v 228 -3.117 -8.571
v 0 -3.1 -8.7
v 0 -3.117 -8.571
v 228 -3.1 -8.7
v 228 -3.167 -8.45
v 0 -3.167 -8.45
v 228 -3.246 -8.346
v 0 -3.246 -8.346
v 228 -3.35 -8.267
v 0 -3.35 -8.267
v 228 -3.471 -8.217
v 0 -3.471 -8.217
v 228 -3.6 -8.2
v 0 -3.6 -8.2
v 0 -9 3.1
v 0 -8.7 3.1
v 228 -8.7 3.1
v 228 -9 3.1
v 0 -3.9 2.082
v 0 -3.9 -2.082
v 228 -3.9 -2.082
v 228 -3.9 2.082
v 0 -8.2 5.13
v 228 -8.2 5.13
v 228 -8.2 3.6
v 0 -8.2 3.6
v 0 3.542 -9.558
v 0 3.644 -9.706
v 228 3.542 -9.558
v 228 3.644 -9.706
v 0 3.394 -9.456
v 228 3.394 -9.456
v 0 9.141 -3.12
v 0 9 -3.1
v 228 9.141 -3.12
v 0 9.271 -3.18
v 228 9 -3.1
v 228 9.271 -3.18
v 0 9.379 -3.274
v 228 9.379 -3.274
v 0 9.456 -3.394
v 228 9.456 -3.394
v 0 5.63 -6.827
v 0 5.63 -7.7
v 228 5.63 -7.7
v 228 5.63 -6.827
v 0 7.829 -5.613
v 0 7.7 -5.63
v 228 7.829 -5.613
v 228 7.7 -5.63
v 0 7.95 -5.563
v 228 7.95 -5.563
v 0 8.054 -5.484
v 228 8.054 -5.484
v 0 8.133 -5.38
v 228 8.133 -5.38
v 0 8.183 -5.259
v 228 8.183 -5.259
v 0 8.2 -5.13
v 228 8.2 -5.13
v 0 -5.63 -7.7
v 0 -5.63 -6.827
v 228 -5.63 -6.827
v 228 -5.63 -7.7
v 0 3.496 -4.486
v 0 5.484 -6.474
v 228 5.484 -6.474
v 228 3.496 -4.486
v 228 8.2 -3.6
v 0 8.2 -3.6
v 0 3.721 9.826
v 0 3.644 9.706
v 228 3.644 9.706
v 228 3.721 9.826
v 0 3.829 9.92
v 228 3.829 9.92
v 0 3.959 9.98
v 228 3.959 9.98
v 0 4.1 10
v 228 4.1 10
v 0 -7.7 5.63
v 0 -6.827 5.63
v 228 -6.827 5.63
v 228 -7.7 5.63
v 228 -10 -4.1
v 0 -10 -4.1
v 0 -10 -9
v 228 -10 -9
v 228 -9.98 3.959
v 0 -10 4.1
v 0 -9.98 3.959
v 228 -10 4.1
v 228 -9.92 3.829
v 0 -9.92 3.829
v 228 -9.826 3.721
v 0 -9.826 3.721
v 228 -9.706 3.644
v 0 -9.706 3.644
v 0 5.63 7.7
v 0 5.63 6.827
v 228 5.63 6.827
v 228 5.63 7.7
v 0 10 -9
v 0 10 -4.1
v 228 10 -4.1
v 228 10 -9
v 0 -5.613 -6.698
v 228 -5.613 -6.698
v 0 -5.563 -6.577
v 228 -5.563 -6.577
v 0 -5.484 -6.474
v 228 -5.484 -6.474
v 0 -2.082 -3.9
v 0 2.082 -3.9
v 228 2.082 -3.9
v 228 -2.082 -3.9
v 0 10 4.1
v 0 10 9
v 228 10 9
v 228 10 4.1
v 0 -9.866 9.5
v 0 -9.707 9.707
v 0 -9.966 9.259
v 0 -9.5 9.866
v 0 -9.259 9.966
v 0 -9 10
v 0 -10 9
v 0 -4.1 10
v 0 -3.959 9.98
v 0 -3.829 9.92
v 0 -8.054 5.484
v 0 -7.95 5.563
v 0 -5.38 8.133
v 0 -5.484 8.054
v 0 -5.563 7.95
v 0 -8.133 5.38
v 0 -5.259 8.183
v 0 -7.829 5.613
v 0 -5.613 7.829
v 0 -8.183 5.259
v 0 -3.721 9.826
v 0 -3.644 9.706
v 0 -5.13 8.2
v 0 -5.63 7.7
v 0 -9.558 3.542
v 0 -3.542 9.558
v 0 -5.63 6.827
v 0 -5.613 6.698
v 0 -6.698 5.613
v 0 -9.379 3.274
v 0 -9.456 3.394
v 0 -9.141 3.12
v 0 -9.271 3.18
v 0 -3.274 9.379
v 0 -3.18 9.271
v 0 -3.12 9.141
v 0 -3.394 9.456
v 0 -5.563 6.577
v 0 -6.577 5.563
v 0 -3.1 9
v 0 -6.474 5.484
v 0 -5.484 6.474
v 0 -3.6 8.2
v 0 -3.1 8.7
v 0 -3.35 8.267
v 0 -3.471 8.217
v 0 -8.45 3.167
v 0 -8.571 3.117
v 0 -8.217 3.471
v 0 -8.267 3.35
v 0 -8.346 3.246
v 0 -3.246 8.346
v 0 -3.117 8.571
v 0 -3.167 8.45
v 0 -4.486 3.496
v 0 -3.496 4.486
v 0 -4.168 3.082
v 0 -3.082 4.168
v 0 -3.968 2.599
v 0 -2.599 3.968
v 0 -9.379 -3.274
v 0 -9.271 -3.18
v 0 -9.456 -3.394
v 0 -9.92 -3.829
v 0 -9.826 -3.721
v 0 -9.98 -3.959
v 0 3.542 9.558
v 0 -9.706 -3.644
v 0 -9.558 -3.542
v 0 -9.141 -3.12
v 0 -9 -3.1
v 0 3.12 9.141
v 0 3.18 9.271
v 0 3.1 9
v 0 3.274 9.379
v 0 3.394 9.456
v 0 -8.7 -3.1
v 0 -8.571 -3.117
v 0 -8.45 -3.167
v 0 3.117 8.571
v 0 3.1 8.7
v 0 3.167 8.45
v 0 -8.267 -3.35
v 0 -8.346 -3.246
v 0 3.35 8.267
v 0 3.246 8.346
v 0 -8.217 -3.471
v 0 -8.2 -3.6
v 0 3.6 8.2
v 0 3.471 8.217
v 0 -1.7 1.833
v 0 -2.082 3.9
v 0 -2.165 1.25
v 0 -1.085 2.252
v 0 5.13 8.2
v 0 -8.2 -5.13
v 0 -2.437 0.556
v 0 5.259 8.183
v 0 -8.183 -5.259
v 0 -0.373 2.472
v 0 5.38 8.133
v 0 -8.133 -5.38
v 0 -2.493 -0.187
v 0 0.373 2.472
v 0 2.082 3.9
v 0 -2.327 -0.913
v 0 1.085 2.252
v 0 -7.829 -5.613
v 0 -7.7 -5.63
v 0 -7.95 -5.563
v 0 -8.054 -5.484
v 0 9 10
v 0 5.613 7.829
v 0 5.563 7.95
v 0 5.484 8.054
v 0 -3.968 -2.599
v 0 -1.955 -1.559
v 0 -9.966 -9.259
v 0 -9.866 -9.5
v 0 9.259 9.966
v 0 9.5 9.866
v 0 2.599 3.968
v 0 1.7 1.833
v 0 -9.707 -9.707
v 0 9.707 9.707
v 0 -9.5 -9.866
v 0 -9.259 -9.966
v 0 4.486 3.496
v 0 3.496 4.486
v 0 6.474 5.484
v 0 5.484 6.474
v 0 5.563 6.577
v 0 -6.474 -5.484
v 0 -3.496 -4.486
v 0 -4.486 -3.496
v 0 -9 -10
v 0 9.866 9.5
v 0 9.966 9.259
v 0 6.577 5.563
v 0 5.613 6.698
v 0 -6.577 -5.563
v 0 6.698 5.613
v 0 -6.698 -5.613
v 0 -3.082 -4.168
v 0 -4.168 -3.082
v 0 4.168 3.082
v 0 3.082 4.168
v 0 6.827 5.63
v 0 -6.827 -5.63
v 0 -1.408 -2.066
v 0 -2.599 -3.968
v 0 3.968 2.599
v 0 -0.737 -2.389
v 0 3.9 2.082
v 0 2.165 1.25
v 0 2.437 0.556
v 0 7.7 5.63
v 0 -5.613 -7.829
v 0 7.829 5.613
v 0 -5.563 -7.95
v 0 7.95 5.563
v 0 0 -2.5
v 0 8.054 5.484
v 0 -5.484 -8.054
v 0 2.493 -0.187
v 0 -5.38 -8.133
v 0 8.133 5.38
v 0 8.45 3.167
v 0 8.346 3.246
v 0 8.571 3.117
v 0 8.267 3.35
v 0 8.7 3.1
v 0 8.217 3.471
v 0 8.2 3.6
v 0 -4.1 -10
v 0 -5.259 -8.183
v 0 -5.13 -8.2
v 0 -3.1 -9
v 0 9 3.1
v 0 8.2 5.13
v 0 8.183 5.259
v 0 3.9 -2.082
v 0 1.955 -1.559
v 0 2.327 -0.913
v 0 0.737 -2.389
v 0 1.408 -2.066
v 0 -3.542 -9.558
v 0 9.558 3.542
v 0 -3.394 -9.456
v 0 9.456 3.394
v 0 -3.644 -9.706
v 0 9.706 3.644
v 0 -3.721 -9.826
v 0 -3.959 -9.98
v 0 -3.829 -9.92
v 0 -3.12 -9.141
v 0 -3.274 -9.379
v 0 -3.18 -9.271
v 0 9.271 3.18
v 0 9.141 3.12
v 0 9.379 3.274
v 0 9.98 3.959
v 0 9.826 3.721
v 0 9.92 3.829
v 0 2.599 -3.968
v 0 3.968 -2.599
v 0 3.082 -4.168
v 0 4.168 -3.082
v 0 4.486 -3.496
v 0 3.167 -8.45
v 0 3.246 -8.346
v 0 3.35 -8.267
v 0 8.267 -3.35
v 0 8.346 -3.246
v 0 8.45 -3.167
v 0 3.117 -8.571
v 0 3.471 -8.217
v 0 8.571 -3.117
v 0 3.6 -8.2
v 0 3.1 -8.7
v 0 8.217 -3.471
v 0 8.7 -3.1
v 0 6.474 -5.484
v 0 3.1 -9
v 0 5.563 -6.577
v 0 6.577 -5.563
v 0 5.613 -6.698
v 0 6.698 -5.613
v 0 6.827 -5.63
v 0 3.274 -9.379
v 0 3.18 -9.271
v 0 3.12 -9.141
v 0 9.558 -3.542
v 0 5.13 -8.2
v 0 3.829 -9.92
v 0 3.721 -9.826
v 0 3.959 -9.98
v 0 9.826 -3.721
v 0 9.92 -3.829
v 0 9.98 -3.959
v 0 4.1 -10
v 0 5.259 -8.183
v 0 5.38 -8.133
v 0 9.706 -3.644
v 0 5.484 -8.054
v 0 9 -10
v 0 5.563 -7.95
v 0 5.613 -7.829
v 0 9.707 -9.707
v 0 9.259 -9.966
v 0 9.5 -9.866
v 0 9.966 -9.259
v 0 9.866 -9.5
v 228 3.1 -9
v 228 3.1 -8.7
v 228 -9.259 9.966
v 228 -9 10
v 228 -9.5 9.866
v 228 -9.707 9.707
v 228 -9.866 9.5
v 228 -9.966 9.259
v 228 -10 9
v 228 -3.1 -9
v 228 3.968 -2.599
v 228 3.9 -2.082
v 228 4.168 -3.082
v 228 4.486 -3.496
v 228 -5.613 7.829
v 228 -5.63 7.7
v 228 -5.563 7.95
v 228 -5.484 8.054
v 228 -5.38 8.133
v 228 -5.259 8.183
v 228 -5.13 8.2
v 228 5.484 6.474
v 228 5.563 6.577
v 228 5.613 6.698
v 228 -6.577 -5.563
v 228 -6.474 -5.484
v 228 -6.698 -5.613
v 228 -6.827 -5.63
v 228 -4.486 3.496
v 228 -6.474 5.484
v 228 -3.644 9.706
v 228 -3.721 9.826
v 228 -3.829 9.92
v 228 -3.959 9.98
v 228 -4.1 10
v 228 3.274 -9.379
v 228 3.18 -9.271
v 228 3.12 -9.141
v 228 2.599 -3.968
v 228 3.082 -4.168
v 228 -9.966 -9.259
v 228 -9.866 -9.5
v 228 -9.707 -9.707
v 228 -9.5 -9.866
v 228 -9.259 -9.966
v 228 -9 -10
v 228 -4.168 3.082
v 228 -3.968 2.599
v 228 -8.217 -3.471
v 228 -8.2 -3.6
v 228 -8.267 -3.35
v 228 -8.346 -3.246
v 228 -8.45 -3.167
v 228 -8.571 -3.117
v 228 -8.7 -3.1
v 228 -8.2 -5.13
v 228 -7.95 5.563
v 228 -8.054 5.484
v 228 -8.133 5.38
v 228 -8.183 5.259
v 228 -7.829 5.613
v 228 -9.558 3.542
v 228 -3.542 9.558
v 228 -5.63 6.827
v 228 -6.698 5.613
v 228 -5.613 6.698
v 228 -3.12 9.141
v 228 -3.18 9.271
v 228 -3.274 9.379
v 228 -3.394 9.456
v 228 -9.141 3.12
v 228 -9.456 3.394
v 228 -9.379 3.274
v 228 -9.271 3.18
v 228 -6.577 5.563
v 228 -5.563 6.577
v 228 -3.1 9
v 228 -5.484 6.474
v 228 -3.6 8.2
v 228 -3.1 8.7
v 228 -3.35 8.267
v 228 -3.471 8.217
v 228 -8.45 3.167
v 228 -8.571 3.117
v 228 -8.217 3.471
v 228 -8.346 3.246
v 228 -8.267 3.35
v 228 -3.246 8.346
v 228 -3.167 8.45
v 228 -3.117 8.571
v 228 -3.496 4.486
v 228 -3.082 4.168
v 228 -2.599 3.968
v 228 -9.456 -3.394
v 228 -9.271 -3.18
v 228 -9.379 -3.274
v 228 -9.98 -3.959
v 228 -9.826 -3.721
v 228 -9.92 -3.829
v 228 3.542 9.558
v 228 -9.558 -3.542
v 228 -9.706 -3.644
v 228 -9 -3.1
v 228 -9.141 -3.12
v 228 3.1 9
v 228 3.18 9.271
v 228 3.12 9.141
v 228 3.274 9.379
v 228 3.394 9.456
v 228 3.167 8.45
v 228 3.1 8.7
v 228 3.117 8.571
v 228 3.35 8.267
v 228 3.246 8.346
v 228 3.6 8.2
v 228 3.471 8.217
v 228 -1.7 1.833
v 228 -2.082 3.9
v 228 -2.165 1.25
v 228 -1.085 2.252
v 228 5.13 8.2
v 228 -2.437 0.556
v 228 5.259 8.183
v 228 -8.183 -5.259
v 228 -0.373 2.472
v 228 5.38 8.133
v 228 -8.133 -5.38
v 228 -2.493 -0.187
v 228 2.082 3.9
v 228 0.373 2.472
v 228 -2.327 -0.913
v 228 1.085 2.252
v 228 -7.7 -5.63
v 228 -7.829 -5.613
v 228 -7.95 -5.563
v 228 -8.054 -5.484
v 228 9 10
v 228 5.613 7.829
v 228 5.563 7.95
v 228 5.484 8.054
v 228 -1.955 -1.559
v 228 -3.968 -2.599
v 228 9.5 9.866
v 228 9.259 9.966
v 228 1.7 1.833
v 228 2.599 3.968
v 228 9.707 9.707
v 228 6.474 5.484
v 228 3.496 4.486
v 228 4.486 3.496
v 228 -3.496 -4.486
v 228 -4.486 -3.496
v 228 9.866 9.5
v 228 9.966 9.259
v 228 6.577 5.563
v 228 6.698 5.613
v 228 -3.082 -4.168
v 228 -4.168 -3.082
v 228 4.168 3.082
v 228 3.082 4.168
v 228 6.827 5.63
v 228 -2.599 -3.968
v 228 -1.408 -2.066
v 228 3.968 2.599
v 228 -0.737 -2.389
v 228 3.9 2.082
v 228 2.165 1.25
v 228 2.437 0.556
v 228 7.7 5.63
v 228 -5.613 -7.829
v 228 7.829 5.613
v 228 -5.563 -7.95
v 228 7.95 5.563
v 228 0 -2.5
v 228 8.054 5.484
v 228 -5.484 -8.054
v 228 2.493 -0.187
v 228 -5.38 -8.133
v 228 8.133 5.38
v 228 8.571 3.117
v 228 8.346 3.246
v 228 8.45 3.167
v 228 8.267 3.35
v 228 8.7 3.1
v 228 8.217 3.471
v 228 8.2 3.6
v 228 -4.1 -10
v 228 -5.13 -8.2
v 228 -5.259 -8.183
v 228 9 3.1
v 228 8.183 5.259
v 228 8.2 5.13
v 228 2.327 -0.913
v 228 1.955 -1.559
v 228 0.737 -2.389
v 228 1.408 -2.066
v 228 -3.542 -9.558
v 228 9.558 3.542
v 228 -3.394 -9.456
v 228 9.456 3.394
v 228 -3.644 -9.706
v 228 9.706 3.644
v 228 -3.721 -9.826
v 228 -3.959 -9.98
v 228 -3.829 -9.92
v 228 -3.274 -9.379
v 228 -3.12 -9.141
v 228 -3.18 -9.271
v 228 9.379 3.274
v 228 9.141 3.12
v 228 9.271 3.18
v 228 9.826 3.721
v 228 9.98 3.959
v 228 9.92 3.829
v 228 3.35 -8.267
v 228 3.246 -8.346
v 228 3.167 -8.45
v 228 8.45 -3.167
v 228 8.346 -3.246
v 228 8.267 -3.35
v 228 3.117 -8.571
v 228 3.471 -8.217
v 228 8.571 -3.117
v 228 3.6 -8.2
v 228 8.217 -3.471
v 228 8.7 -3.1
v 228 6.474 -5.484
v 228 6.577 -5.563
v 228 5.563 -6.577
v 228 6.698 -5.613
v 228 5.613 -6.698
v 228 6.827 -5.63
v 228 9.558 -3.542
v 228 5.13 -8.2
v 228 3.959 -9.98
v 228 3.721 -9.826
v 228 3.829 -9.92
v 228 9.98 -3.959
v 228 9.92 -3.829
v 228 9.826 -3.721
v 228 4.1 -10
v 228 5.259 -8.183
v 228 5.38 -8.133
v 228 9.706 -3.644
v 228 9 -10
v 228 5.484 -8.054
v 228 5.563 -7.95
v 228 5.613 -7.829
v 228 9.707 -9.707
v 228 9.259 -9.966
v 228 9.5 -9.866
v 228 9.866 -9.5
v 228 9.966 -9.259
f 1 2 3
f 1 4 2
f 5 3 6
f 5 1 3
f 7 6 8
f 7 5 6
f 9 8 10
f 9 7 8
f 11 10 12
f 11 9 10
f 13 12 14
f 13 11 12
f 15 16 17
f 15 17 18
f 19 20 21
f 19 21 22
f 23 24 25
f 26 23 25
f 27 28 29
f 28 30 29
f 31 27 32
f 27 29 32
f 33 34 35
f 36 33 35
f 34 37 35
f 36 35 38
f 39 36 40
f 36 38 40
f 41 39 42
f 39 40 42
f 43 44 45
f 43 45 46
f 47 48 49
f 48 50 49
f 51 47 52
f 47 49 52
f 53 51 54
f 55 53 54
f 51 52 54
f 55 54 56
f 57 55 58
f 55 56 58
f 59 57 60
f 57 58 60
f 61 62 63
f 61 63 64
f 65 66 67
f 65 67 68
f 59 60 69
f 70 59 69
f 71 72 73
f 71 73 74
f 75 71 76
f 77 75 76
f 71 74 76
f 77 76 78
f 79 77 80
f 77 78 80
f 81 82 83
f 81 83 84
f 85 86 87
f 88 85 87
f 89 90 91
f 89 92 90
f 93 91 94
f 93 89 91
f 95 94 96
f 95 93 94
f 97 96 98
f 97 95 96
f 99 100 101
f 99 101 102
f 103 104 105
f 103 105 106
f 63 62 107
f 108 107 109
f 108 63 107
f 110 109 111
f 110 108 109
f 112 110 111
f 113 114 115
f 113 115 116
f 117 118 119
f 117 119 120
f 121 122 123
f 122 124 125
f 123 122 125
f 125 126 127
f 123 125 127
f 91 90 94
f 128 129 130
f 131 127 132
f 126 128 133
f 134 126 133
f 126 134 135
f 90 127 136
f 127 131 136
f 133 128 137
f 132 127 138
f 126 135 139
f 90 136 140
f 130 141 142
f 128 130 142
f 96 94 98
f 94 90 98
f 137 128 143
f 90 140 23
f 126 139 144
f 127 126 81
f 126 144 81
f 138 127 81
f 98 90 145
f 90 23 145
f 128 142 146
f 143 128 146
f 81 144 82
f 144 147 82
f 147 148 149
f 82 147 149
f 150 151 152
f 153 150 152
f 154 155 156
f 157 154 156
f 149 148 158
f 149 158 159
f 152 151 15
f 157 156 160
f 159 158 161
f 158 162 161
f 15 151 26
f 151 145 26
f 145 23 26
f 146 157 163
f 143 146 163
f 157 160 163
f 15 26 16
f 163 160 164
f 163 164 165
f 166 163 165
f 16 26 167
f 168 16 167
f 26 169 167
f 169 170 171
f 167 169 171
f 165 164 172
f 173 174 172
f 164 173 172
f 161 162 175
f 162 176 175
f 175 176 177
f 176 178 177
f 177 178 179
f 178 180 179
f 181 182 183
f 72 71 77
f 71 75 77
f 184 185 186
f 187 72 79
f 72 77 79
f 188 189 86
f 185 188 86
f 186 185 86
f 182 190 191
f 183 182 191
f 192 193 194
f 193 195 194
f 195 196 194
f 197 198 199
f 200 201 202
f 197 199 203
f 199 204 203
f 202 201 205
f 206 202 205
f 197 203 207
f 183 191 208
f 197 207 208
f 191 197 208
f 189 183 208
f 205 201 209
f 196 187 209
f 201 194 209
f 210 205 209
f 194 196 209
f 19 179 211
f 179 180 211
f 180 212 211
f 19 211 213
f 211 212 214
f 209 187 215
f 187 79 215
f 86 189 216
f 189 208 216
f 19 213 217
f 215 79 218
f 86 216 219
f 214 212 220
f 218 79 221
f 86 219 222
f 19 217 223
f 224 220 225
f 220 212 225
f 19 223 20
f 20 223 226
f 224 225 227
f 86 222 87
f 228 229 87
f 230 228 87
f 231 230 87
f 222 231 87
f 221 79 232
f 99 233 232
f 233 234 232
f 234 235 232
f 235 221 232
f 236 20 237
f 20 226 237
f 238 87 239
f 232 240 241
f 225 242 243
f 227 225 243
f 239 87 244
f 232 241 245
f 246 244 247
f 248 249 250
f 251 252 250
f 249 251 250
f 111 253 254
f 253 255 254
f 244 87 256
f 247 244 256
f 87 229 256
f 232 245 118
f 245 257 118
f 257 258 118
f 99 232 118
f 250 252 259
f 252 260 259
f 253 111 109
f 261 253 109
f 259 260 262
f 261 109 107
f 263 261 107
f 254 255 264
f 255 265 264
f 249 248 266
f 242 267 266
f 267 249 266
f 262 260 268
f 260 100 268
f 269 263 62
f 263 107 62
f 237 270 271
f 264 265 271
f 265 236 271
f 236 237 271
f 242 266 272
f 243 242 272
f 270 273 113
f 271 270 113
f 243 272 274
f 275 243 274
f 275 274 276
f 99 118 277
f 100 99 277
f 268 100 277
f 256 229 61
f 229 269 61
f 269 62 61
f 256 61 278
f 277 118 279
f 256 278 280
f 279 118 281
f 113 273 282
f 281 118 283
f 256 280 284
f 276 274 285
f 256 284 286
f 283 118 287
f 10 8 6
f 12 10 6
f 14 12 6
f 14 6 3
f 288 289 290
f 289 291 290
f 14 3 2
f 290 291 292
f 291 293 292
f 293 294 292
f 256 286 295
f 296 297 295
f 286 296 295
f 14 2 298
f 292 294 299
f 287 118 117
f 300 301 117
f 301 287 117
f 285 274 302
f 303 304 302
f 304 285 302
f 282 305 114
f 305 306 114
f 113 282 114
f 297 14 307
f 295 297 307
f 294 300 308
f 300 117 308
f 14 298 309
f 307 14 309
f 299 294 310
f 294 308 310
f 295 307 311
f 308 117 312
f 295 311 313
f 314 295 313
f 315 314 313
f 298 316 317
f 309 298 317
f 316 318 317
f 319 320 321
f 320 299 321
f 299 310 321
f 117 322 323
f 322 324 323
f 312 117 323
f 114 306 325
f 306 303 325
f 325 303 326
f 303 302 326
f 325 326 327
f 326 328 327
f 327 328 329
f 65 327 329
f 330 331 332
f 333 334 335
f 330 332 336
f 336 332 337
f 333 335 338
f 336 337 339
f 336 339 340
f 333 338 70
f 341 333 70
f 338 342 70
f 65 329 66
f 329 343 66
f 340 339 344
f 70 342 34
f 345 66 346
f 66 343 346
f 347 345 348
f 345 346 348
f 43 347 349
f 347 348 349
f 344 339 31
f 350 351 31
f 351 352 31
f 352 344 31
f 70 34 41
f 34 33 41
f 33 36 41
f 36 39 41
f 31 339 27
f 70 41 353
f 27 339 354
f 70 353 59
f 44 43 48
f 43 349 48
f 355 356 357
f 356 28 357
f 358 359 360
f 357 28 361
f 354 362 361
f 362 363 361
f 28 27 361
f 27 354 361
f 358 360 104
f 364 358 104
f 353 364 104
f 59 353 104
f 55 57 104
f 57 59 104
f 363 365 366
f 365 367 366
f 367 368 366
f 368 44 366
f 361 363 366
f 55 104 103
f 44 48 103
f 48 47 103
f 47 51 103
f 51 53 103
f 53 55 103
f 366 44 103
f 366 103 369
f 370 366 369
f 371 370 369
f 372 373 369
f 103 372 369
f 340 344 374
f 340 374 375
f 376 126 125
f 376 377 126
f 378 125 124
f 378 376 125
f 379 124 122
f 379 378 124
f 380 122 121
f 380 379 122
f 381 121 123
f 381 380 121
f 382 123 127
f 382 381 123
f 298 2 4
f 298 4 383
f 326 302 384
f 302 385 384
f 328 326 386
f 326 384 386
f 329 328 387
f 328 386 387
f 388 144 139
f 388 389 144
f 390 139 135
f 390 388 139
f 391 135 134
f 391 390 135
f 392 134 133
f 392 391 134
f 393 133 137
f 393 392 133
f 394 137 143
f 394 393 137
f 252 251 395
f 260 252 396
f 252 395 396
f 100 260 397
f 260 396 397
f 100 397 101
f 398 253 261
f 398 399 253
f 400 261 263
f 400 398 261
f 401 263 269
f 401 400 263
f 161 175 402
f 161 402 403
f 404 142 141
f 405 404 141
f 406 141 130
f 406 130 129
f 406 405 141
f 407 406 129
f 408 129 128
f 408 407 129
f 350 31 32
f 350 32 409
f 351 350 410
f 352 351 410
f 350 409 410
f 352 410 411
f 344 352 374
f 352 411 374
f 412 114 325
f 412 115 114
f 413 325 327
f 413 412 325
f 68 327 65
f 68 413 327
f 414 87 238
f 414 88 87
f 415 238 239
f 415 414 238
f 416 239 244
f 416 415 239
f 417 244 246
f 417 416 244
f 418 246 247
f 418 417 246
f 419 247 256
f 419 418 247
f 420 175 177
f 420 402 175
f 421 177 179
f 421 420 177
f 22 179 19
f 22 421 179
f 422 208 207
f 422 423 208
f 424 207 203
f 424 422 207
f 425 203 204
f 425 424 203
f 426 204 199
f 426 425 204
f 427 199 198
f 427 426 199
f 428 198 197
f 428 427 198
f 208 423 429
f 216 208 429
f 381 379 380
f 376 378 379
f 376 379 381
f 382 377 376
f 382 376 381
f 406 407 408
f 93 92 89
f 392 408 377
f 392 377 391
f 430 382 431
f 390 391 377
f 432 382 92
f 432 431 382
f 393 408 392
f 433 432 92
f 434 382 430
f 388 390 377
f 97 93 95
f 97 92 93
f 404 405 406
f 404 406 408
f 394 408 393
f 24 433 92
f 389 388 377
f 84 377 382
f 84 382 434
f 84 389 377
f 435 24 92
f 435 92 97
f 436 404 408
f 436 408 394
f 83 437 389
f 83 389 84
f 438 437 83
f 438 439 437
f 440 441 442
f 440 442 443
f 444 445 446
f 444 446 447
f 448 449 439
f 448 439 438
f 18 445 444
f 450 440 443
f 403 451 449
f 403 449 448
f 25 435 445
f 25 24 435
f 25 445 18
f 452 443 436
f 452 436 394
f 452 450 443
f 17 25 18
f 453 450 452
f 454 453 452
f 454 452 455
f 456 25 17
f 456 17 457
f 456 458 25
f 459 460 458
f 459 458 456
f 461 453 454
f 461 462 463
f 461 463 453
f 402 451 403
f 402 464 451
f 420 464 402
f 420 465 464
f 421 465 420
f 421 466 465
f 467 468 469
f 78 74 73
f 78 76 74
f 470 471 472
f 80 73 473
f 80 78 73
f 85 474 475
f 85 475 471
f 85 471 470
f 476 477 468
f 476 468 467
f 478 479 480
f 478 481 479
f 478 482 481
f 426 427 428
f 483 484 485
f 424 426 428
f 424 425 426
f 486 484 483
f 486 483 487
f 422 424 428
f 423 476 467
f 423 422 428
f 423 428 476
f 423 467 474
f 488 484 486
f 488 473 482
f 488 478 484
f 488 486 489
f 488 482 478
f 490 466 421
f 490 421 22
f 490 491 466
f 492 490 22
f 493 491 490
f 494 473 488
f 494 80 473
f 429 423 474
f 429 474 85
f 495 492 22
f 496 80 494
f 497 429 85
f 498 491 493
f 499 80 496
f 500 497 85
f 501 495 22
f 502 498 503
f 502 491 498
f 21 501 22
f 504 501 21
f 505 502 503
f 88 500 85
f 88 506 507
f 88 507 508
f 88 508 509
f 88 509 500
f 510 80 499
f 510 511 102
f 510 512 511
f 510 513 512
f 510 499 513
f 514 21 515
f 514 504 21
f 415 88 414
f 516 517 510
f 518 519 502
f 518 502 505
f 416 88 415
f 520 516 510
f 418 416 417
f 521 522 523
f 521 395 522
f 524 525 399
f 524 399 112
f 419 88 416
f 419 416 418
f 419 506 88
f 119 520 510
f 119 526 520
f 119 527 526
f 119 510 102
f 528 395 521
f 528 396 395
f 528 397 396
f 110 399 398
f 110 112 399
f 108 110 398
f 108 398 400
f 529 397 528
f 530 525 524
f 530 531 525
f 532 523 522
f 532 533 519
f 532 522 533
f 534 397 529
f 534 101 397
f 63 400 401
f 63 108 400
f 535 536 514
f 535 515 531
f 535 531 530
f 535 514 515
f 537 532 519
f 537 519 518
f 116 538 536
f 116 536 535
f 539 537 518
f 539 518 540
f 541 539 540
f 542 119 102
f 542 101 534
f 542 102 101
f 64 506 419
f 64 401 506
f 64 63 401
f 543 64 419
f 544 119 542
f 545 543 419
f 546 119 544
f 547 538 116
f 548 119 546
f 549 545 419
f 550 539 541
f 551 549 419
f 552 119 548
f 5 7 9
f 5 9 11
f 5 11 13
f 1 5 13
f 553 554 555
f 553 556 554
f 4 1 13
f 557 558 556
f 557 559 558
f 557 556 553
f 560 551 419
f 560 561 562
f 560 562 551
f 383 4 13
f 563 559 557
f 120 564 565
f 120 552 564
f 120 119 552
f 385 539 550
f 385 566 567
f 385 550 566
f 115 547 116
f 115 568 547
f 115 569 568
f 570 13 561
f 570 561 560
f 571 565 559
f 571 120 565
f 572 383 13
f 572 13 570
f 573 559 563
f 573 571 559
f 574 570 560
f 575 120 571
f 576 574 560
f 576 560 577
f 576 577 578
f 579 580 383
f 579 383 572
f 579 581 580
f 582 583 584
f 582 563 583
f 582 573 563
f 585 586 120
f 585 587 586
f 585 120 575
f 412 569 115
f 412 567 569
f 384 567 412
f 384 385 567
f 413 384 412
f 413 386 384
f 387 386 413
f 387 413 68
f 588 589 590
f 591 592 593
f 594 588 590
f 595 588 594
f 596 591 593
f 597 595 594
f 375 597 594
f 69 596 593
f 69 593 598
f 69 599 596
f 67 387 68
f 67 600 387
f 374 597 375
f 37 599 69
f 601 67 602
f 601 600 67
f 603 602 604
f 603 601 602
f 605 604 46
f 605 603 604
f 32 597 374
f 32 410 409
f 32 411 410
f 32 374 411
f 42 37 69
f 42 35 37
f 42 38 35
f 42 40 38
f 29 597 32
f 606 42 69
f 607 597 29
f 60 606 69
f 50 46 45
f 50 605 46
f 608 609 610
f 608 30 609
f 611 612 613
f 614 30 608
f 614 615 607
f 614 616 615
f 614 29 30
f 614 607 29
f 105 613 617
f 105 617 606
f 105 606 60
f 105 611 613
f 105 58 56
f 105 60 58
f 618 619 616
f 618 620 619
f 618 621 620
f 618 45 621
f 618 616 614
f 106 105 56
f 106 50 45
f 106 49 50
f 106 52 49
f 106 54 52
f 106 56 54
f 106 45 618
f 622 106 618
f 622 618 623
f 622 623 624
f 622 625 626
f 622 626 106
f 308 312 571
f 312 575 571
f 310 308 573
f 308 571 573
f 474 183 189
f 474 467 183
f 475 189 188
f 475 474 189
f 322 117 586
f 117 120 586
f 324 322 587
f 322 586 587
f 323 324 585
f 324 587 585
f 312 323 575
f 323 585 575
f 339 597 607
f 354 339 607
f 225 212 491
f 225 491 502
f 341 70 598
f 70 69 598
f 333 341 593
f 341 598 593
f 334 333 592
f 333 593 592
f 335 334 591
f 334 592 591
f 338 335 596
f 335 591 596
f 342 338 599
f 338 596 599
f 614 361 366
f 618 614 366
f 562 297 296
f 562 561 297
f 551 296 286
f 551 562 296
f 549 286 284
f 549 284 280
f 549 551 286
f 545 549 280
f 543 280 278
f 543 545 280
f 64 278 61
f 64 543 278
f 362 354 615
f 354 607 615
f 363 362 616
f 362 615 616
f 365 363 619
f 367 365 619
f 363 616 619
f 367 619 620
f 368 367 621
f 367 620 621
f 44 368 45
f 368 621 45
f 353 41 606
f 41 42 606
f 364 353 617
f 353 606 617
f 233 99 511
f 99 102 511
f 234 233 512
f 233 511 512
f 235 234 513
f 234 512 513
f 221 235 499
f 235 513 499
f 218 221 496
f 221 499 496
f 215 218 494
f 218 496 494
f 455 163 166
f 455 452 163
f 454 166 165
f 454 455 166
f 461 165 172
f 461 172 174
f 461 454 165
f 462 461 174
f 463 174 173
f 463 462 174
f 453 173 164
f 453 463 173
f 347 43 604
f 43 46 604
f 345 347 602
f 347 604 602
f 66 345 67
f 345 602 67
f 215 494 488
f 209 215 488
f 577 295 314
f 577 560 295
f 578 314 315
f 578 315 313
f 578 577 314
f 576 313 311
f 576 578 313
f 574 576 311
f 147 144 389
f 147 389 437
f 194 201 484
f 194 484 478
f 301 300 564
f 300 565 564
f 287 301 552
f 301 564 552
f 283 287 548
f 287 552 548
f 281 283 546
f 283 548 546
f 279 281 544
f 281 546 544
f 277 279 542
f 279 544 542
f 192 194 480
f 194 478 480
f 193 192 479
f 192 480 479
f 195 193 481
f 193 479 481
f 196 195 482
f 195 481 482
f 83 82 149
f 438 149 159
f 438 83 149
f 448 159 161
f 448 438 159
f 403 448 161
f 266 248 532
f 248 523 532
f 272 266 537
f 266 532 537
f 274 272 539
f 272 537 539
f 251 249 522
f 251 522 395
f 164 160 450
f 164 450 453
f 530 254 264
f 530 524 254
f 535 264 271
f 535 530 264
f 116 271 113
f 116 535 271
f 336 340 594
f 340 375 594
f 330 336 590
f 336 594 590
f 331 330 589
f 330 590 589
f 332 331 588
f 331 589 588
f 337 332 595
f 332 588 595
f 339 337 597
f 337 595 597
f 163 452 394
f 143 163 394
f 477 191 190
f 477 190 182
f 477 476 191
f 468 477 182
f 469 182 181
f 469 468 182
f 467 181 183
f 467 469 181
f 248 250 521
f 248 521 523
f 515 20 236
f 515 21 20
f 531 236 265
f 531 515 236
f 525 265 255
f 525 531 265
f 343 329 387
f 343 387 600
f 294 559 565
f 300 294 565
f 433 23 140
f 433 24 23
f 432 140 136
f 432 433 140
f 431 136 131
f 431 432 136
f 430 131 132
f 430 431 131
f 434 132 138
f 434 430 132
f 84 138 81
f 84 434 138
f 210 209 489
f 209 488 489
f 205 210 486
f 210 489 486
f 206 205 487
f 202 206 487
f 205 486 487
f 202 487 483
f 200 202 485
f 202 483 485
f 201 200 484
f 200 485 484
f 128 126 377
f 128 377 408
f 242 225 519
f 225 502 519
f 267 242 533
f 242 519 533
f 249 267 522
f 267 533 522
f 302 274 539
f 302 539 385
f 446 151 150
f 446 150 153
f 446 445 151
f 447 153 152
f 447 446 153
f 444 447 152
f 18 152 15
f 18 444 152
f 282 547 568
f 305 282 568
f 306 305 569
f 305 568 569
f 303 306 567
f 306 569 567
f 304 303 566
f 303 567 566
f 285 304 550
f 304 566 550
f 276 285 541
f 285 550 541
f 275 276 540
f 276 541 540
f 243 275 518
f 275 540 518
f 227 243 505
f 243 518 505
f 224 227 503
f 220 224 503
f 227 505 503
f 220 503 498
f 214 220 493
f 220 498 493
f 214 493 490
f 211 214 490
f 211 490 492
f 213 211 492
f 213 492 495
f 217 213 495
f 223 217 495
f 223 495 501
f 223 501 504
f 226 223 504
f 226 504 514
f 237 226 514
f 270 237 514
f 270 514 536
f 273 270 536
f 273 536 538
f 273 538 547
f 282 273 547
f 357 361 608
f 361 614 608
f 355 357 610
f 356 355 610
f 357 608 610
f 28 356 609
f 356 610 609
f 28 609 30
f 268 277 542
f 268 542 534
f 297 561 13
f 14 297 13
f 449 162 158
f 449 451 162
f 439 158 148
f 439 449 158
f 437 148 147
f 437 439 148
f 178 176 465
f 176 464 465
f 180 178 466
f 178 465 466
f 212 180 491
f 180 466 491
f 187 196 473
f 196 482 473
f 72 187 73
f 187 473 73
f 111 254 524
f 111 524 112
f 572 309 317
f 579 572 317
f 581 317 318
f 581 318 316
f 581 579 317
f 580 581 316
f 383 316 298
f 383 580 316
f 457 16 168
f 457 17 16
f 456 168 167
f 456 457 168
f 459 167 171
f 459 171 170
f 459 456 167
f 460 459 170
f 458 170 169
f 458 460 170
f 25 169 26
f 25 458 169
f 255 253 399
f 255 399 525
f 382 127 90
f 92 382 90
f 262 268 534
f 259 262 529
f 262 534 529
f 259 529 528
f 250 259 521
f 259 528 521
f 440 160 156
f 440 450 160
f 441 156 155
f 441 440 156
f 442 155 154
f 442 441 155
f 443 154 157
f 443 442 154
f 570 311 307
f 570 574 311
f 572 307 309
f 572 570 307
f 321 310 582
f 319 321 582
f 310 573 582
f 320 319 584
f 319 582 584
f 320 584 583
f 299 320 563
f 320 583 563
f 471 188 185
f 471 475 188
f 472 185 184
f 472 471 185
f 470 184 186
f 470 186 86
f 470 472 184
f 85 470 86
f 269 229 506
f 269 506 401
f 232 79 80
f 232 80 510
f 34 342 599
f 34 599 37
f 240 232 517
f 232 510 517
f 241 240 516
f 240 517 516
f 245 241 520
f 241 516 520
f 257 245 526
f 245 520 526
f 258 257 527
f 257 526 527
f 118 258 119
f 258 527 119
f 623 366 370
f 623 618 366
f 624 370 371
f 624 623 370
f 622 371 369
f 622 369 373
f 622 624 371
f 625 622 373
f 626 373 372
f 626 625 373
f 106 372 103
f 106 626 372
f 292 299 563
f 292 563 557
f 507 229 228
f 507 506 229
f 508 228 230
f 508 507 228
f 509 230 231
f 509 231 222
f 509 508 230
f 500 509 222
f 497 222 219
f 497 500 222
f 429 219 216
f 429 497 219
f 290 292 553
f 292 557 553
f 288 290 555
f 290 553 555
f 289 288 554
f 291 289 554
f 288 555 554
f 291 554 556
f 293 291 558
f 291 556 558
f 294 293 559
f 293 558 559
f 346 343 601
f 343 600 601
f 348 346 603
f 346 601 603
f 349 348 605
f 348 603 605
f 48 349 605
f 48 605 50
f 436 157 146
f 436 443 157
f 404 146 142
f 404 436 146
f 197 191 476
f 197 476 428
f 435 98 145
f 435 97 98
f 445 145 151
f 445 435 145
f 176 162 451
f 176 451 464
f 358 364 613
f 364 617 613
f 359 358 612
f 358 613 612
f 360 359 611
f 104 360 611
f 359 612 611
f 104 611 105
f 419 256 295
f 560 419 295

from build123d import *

# Parameters (mm, degrees)
SKETCH1_W                = 20
SKETCH1_H                = 20
BOSS_EXTRUDE1_DEPTH      = 228
FILLET1_R                = 1
CUT_EXTRUDE1_DEPTH       = 229.438175444
F_5_0_5_DIAMETER_HOLE1_D = 5
FILLET2_R                = 2
FILLET3_R                = 0.5
FILLET4_R                = 0.5
FILLET5_R                = 0.5


with BuildPart() as part:
    # Sketch1 → Boss-Extrude1 (new body)
    with BuildSketch(Plane(origin=(0, 0, 0), x_dir=(0, 0, -1), z_dir=(1, 0, 0))):
        Rectangle(SKETCH1_W, SKETCH1_H)
    extrude(amount=BOSS_EXTRUDE1_DEPTH)

    # Fillet1
    fillet1_edges = [part.edges().sort_by_distance(p)[0] for p in [
        (114, 10, 10),
        (114, 10, -10),
        (114, -10, -10),
        (114, -10, 10),
    ]]
    fillet(fillet1_edges, radius=FILLET1_R)

    # Sketch3 → Cut-Extrude1 (cut, through all)
    with BuildSketch(Plane.ZY):
        Polygon((-3.6, 10), (3.6, 10), (3.6, 9.5), (3.1, 9.5), (3.1, 8.2), (5.63, 8.2), (5.63, 6.619949494), (2.910050506, 3.9), (-2.910050506, 3.9), (-5.63, 6.619949494), (-5.63, 8.2), (-3.1, 8.2), (-3.1, 9.5), (-3.6, 9.5), align=None)
        Polygon((10, 3.6), (10, -3.6), (9.5, -3.6), (9.5, -3.1), (8.2, -3.1), (8.2, -5.63), (6.619949494, -5.63), (3.9, -2.910050506), (3.9, 2.910050506), (6.619949494, 5.63), (8.2, 5.63), (8.2, 3.1), (9.5, 3.1), (9.5, 3.6), align=None)
        Polygon((3.6, -10), (-3.6, -10), (-3.6, -9.5), (-3.1, -9.5), (-3.1, -8.2), (-5.63, -8.2), (-5.63, -6.619949494), (-2.910050506, -3.9), (2.910050506, -3.9), (5.63, -6.619949494), (5.63, -8.2), (3.1, -8.2), (3.1, -9.5), (3.6, -9.5), align=None)
        Polygon((-10, -3.6), (-10, 3.6), (-9.5, 3.6), (-9.5, 3.1), (-8.2, 3.1), (-8.2, 5.63), (-6.619949494, 5.63), (-3.9, 2.910050506), (-3.9, -2.910050506), (-6.619949494, -5.63), (-8.2, -5.63), (-8.2, -3.1), (-9.5, -3.1), (-9.5, -3.6), align=None)
    extrude(amount=-CUT_EXTRUDE1_DEPTH, mode=Mode.SUBTRACT)

    # Ø5.0 (5) Diameter Hole1 (through all)
    with Locations(Plane.ZY):
        with Locations((0, 0)):
            Hole(F_5_0_5_DIAMETER_HOLE1_D / 2)

    # Fillet2
    fillet2_edges = [part.edges().sort_by_distance(p)[0] for p in [
        (114, -3.9, -2.910050506),
        (114, -3.9, 2.910050506),
        (114, 2.910050506, -3.9),
        (114, -2.910050506, -3.9),
        (114, -2.910050506, 3.9),
        (114, 2.910050506, 3.9),
        (114, 3.9, 2.910050506),
        (114, 3.9, -2.910050506),
    ]]
    fillet(fillet2_edges, radius=FILLET2_R)

    # Fillet3
    fillet3_edges = [part.edges().sort_by_distance(p)[0] for p in [
        (114, 3.6, -10),
        (114, 3.1, -9.5),
        (114, 3.1, -8.2),
        (114, 5.63, -8.2),
        (114, 5.63, -6.619949494),
        (114, 3.6, 10),
        (114, 3.1, 9.5),
        (114, 3.1, 8.2),
        (114, 5.63, 8.2),
        (114, 5.63, 6.619949494),
        (114, 6.619949494, 5.63),
        (114, 8.2, 5.63),
        (114, 8.2, 3.1),
        (114, 9.5, 3.1),
        (114, 10, 3.6),
        (114, 9.5, -3.1),
        (114, 10, -3.6),
        (114, 8.2, -3.1),
        (114, 8.2, -5.63),
        (114, 6.619949494, -5.63),
    ]]
    fillet(fillet3_edges, radius=FILLET3_R - 0.0001)  # a hair under: the kernel refuses the full size

    # Fillet4
    fillet4_edges = [part.edges().sort_by_distance(p)[0] for p in [
        (114, -3.6, 10),
        (114, -3.1, 9.5),
        (114, -3.1, 8.2),
        (114, -5.63, 8.2),
        (114, -5.63, 6.619949494),
        (114, -6.619949494, 5.63),
        (114, -8.2, 5.63),
        (114, -8.2, 3.1),
        (114, -10, 3.6),
        (114, -9.5, 3.1),
        (114, -10, -3.6),
        (114, -9.5, -3.1),
        (114, -8.2, -3.1),
        (114, -8.2, -5.63),
        (114, -6.619949494, -5.63),
        (114, -5.63, -6.619949494),
        (114, -5.63, -8.2),
        (114, -3.1, -8.2),
        (114, -3.1, -9.5),
        (114, -3.6, -10),
    ]]
    fillet(fillet4_edges, radius=FILLET4_R - 0.0001)  # a hair under: the kernel refuses the full size

    # Fillet5
    fillet5_edges = [part.edges().sort_by_distance(p)[0] for p in [
        (114, 3.6, 9.5),
        (114, 9.5, 3.6),
        (114, 9.5, -3.6),
        (114, 3.6, -9.5),
        (114, -3.6, 9.5),
        (114, -9.5, 3.6),
        (114, -9.5, -3.6),
        (114, -3.6, -9.5),
    ]]
    fillet(fillet5_edges, radius=FILLET5_R)


solid = part.part
